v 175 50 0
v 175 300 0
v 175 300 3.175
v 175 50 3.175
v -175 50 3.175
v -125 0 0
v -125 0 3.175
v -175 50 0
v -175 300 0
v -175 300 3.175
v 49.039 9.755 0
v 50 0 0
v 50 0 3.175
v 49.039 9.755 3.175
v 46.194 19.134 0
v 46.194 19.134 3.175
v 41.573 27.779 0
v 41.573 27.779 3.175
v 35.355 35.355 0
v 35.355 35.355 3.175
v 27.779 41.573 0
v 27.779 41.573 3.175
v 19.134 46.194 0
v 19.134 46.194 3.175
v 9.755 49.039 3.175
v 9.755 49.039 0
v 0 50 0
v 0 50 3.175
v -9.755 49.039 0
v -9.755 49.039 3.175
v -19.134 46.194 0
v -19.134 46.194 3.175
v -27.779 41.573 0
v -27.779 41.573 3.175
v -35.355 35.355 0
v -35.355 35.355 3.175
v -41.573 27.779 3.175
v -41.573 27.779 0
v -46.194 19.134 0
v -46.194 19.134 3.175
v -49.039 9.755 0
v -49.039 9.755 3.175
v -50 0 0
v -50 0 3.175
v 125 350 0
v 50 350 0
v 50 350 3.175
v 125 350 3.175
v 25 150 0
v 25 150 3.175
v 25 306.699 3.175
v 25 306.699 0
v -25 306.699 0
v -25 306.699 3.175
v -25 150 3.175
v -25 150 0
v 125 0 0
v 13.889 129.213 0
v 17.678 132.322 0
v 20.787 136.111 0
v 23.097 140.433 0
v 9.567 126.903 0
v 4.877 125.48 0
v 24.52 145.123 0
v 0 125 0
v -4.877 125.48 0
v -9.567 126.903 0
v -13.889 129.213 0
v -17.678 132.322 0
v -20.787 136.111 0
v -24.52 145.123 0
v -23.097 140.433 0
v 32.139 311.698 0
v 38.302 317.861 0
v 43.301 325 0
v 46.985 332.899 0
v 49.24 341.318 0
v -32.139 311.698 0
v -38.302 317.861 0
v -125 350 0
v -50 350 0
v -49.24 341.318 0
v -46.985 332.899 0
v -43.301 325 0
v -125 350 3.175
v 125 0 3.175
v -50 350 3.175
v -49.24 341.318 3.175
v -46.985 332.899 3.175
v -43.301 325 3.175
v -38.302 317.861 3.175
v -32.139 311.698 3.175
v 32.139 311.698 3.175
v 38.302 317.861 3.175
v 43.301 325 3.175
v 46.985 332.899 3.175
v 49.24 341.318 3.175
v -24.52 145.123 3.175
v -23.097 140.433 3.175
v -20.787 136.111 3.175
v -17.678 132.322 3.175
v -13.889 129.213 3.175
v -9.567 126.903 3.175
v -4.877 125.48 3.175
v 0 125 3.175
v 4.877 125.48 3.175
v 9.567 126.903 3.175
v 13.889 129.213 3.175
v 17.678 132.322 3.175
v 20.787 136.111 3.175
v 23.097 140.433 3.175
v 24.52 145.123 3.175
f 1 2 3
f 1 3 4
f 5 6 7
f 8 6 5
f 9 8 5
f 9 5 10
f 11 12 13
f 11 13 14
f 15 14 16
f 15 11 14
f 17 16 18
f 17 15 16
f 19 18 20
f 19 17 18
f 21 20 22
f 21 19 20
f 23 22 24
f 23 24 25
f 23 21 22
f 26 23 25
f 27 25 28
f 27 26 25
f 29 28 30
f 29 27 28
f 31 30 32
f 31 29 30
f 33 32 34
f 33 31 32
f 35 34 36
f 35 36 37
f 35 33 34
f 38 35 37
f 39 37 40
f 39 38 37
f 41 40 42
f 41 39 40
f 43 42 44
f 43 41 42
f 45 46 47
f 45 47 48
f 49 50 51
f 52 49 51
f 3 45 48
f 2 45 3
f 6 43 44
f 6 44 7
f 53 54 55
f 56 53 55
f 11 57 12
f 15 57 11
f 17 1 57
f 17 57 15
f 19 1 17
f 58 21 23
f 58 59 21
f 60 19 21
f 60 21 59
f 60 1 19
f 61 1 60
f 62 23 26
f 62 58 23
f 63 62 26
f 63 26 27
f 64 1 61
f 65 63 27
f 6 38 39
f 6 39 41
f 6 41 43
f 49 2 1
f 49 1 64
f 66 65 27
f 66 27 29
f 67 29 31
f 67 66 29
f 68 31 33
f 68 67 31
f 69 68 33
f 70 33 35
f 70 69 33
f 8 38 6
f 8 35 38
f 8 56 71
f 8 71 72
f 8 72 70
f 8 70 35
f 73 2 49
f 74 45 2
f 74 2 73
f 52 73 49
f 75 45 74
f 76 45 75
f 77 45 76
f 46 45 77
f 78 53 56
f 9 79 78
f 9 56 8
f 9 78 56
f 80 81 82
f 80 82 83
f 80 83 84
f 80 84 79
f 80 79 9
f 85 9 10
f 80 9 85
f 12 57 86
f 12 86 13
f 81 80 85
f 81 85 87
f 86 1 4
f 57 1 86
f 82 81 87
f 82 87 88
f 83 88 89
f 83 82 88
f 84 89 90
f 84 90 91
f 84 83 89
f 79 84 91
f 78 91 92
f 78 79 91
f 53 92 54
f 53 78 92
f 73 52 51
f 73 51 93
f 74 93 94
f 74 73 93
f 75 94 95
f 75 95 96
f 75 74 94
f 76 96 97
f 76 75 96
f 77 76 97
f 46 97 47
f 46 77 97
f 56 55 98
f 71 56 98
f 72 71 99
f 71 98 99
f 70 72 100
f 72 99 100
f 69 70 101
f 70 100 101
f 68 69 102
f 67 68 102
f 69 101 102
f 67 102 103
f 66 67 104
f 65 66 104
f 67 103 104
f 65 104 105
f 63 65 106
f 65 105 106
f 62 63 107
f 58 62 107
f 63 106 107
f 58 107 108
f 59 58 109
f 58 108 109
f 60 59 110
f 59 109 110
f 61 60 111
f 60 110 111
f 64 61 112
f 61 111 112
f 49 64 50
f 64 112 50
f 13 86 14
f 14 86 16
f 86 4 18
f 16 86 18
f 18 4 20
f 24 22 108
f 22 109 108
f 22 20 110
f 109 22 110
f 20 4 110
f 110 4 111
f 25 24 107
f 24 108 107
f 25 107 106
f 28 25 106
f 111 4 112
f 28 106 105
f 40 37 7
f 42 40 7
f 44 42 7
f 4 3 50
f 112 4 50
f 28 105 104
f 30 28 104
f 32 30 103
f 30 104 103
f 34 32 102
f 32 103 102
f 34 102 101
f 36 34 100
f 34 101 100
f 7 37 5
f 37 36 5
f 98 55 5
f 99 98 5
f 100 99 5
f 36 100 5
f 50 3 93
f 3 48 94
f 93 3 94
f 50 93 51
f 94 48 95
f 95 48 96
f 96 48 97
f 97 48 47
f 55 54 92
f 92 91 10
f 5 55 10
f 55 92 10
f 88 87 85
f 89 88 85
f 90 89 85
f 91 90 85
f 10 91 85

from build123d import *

# Parameters (mm, degrees)
BOSS_EXTRUDE1_DEPTH = 3.175
CUT_EXTRUDE1_DEPTH  = 3.175


with BuildPart() as part:
    # Sketch1 → Boss-Extrude1 (new body)
    with BuildSketch(Plane.XY):
        with BuildLine():
            Line((175, 300), (175, 50))
            Line((175, 50), (125, 0))
            Line((125, 0), (50, 0))
            ThreePointArc((50, 0), (0, 50), (-50, 0))
            Line((-50, 0), (-125, 0))
            Line((-125, 0), (-175, 50))
            Line((-175, 50), (-175, 300))
            Line((-175, 300), (-125, 350))
            Line((-125, 350), (-50, 350))
            ThreePointArc((-50, 350), (0, 300), (50, 350))
            Line((50, 350), (125, 350))
            Line((125, 350), (175, 300))
        make_face()
    extrude(amount=BOSS_EXTRUDE1_DEPTH)

    # Sketch2 → Cut-Extrude1 (cut)
    with BuildSketch(Plane.XY.offset(3.175)):
        with BuildLine():
            Line((-25, 306.698729811), (-25, 150))
            ThreePointArc((-25, 150), (0, 125), (25, 150))
            Line((25, 150), (25, 306.698729811))
            ThreePointArc((25, 306.698729811), (0, 300), (-25, 306.698729811))
        make_face()
    extrude(amount=-CUT_EXTRUDE1_DEPTH, mode=Mode.SUBTRACT)


solid = part.part
